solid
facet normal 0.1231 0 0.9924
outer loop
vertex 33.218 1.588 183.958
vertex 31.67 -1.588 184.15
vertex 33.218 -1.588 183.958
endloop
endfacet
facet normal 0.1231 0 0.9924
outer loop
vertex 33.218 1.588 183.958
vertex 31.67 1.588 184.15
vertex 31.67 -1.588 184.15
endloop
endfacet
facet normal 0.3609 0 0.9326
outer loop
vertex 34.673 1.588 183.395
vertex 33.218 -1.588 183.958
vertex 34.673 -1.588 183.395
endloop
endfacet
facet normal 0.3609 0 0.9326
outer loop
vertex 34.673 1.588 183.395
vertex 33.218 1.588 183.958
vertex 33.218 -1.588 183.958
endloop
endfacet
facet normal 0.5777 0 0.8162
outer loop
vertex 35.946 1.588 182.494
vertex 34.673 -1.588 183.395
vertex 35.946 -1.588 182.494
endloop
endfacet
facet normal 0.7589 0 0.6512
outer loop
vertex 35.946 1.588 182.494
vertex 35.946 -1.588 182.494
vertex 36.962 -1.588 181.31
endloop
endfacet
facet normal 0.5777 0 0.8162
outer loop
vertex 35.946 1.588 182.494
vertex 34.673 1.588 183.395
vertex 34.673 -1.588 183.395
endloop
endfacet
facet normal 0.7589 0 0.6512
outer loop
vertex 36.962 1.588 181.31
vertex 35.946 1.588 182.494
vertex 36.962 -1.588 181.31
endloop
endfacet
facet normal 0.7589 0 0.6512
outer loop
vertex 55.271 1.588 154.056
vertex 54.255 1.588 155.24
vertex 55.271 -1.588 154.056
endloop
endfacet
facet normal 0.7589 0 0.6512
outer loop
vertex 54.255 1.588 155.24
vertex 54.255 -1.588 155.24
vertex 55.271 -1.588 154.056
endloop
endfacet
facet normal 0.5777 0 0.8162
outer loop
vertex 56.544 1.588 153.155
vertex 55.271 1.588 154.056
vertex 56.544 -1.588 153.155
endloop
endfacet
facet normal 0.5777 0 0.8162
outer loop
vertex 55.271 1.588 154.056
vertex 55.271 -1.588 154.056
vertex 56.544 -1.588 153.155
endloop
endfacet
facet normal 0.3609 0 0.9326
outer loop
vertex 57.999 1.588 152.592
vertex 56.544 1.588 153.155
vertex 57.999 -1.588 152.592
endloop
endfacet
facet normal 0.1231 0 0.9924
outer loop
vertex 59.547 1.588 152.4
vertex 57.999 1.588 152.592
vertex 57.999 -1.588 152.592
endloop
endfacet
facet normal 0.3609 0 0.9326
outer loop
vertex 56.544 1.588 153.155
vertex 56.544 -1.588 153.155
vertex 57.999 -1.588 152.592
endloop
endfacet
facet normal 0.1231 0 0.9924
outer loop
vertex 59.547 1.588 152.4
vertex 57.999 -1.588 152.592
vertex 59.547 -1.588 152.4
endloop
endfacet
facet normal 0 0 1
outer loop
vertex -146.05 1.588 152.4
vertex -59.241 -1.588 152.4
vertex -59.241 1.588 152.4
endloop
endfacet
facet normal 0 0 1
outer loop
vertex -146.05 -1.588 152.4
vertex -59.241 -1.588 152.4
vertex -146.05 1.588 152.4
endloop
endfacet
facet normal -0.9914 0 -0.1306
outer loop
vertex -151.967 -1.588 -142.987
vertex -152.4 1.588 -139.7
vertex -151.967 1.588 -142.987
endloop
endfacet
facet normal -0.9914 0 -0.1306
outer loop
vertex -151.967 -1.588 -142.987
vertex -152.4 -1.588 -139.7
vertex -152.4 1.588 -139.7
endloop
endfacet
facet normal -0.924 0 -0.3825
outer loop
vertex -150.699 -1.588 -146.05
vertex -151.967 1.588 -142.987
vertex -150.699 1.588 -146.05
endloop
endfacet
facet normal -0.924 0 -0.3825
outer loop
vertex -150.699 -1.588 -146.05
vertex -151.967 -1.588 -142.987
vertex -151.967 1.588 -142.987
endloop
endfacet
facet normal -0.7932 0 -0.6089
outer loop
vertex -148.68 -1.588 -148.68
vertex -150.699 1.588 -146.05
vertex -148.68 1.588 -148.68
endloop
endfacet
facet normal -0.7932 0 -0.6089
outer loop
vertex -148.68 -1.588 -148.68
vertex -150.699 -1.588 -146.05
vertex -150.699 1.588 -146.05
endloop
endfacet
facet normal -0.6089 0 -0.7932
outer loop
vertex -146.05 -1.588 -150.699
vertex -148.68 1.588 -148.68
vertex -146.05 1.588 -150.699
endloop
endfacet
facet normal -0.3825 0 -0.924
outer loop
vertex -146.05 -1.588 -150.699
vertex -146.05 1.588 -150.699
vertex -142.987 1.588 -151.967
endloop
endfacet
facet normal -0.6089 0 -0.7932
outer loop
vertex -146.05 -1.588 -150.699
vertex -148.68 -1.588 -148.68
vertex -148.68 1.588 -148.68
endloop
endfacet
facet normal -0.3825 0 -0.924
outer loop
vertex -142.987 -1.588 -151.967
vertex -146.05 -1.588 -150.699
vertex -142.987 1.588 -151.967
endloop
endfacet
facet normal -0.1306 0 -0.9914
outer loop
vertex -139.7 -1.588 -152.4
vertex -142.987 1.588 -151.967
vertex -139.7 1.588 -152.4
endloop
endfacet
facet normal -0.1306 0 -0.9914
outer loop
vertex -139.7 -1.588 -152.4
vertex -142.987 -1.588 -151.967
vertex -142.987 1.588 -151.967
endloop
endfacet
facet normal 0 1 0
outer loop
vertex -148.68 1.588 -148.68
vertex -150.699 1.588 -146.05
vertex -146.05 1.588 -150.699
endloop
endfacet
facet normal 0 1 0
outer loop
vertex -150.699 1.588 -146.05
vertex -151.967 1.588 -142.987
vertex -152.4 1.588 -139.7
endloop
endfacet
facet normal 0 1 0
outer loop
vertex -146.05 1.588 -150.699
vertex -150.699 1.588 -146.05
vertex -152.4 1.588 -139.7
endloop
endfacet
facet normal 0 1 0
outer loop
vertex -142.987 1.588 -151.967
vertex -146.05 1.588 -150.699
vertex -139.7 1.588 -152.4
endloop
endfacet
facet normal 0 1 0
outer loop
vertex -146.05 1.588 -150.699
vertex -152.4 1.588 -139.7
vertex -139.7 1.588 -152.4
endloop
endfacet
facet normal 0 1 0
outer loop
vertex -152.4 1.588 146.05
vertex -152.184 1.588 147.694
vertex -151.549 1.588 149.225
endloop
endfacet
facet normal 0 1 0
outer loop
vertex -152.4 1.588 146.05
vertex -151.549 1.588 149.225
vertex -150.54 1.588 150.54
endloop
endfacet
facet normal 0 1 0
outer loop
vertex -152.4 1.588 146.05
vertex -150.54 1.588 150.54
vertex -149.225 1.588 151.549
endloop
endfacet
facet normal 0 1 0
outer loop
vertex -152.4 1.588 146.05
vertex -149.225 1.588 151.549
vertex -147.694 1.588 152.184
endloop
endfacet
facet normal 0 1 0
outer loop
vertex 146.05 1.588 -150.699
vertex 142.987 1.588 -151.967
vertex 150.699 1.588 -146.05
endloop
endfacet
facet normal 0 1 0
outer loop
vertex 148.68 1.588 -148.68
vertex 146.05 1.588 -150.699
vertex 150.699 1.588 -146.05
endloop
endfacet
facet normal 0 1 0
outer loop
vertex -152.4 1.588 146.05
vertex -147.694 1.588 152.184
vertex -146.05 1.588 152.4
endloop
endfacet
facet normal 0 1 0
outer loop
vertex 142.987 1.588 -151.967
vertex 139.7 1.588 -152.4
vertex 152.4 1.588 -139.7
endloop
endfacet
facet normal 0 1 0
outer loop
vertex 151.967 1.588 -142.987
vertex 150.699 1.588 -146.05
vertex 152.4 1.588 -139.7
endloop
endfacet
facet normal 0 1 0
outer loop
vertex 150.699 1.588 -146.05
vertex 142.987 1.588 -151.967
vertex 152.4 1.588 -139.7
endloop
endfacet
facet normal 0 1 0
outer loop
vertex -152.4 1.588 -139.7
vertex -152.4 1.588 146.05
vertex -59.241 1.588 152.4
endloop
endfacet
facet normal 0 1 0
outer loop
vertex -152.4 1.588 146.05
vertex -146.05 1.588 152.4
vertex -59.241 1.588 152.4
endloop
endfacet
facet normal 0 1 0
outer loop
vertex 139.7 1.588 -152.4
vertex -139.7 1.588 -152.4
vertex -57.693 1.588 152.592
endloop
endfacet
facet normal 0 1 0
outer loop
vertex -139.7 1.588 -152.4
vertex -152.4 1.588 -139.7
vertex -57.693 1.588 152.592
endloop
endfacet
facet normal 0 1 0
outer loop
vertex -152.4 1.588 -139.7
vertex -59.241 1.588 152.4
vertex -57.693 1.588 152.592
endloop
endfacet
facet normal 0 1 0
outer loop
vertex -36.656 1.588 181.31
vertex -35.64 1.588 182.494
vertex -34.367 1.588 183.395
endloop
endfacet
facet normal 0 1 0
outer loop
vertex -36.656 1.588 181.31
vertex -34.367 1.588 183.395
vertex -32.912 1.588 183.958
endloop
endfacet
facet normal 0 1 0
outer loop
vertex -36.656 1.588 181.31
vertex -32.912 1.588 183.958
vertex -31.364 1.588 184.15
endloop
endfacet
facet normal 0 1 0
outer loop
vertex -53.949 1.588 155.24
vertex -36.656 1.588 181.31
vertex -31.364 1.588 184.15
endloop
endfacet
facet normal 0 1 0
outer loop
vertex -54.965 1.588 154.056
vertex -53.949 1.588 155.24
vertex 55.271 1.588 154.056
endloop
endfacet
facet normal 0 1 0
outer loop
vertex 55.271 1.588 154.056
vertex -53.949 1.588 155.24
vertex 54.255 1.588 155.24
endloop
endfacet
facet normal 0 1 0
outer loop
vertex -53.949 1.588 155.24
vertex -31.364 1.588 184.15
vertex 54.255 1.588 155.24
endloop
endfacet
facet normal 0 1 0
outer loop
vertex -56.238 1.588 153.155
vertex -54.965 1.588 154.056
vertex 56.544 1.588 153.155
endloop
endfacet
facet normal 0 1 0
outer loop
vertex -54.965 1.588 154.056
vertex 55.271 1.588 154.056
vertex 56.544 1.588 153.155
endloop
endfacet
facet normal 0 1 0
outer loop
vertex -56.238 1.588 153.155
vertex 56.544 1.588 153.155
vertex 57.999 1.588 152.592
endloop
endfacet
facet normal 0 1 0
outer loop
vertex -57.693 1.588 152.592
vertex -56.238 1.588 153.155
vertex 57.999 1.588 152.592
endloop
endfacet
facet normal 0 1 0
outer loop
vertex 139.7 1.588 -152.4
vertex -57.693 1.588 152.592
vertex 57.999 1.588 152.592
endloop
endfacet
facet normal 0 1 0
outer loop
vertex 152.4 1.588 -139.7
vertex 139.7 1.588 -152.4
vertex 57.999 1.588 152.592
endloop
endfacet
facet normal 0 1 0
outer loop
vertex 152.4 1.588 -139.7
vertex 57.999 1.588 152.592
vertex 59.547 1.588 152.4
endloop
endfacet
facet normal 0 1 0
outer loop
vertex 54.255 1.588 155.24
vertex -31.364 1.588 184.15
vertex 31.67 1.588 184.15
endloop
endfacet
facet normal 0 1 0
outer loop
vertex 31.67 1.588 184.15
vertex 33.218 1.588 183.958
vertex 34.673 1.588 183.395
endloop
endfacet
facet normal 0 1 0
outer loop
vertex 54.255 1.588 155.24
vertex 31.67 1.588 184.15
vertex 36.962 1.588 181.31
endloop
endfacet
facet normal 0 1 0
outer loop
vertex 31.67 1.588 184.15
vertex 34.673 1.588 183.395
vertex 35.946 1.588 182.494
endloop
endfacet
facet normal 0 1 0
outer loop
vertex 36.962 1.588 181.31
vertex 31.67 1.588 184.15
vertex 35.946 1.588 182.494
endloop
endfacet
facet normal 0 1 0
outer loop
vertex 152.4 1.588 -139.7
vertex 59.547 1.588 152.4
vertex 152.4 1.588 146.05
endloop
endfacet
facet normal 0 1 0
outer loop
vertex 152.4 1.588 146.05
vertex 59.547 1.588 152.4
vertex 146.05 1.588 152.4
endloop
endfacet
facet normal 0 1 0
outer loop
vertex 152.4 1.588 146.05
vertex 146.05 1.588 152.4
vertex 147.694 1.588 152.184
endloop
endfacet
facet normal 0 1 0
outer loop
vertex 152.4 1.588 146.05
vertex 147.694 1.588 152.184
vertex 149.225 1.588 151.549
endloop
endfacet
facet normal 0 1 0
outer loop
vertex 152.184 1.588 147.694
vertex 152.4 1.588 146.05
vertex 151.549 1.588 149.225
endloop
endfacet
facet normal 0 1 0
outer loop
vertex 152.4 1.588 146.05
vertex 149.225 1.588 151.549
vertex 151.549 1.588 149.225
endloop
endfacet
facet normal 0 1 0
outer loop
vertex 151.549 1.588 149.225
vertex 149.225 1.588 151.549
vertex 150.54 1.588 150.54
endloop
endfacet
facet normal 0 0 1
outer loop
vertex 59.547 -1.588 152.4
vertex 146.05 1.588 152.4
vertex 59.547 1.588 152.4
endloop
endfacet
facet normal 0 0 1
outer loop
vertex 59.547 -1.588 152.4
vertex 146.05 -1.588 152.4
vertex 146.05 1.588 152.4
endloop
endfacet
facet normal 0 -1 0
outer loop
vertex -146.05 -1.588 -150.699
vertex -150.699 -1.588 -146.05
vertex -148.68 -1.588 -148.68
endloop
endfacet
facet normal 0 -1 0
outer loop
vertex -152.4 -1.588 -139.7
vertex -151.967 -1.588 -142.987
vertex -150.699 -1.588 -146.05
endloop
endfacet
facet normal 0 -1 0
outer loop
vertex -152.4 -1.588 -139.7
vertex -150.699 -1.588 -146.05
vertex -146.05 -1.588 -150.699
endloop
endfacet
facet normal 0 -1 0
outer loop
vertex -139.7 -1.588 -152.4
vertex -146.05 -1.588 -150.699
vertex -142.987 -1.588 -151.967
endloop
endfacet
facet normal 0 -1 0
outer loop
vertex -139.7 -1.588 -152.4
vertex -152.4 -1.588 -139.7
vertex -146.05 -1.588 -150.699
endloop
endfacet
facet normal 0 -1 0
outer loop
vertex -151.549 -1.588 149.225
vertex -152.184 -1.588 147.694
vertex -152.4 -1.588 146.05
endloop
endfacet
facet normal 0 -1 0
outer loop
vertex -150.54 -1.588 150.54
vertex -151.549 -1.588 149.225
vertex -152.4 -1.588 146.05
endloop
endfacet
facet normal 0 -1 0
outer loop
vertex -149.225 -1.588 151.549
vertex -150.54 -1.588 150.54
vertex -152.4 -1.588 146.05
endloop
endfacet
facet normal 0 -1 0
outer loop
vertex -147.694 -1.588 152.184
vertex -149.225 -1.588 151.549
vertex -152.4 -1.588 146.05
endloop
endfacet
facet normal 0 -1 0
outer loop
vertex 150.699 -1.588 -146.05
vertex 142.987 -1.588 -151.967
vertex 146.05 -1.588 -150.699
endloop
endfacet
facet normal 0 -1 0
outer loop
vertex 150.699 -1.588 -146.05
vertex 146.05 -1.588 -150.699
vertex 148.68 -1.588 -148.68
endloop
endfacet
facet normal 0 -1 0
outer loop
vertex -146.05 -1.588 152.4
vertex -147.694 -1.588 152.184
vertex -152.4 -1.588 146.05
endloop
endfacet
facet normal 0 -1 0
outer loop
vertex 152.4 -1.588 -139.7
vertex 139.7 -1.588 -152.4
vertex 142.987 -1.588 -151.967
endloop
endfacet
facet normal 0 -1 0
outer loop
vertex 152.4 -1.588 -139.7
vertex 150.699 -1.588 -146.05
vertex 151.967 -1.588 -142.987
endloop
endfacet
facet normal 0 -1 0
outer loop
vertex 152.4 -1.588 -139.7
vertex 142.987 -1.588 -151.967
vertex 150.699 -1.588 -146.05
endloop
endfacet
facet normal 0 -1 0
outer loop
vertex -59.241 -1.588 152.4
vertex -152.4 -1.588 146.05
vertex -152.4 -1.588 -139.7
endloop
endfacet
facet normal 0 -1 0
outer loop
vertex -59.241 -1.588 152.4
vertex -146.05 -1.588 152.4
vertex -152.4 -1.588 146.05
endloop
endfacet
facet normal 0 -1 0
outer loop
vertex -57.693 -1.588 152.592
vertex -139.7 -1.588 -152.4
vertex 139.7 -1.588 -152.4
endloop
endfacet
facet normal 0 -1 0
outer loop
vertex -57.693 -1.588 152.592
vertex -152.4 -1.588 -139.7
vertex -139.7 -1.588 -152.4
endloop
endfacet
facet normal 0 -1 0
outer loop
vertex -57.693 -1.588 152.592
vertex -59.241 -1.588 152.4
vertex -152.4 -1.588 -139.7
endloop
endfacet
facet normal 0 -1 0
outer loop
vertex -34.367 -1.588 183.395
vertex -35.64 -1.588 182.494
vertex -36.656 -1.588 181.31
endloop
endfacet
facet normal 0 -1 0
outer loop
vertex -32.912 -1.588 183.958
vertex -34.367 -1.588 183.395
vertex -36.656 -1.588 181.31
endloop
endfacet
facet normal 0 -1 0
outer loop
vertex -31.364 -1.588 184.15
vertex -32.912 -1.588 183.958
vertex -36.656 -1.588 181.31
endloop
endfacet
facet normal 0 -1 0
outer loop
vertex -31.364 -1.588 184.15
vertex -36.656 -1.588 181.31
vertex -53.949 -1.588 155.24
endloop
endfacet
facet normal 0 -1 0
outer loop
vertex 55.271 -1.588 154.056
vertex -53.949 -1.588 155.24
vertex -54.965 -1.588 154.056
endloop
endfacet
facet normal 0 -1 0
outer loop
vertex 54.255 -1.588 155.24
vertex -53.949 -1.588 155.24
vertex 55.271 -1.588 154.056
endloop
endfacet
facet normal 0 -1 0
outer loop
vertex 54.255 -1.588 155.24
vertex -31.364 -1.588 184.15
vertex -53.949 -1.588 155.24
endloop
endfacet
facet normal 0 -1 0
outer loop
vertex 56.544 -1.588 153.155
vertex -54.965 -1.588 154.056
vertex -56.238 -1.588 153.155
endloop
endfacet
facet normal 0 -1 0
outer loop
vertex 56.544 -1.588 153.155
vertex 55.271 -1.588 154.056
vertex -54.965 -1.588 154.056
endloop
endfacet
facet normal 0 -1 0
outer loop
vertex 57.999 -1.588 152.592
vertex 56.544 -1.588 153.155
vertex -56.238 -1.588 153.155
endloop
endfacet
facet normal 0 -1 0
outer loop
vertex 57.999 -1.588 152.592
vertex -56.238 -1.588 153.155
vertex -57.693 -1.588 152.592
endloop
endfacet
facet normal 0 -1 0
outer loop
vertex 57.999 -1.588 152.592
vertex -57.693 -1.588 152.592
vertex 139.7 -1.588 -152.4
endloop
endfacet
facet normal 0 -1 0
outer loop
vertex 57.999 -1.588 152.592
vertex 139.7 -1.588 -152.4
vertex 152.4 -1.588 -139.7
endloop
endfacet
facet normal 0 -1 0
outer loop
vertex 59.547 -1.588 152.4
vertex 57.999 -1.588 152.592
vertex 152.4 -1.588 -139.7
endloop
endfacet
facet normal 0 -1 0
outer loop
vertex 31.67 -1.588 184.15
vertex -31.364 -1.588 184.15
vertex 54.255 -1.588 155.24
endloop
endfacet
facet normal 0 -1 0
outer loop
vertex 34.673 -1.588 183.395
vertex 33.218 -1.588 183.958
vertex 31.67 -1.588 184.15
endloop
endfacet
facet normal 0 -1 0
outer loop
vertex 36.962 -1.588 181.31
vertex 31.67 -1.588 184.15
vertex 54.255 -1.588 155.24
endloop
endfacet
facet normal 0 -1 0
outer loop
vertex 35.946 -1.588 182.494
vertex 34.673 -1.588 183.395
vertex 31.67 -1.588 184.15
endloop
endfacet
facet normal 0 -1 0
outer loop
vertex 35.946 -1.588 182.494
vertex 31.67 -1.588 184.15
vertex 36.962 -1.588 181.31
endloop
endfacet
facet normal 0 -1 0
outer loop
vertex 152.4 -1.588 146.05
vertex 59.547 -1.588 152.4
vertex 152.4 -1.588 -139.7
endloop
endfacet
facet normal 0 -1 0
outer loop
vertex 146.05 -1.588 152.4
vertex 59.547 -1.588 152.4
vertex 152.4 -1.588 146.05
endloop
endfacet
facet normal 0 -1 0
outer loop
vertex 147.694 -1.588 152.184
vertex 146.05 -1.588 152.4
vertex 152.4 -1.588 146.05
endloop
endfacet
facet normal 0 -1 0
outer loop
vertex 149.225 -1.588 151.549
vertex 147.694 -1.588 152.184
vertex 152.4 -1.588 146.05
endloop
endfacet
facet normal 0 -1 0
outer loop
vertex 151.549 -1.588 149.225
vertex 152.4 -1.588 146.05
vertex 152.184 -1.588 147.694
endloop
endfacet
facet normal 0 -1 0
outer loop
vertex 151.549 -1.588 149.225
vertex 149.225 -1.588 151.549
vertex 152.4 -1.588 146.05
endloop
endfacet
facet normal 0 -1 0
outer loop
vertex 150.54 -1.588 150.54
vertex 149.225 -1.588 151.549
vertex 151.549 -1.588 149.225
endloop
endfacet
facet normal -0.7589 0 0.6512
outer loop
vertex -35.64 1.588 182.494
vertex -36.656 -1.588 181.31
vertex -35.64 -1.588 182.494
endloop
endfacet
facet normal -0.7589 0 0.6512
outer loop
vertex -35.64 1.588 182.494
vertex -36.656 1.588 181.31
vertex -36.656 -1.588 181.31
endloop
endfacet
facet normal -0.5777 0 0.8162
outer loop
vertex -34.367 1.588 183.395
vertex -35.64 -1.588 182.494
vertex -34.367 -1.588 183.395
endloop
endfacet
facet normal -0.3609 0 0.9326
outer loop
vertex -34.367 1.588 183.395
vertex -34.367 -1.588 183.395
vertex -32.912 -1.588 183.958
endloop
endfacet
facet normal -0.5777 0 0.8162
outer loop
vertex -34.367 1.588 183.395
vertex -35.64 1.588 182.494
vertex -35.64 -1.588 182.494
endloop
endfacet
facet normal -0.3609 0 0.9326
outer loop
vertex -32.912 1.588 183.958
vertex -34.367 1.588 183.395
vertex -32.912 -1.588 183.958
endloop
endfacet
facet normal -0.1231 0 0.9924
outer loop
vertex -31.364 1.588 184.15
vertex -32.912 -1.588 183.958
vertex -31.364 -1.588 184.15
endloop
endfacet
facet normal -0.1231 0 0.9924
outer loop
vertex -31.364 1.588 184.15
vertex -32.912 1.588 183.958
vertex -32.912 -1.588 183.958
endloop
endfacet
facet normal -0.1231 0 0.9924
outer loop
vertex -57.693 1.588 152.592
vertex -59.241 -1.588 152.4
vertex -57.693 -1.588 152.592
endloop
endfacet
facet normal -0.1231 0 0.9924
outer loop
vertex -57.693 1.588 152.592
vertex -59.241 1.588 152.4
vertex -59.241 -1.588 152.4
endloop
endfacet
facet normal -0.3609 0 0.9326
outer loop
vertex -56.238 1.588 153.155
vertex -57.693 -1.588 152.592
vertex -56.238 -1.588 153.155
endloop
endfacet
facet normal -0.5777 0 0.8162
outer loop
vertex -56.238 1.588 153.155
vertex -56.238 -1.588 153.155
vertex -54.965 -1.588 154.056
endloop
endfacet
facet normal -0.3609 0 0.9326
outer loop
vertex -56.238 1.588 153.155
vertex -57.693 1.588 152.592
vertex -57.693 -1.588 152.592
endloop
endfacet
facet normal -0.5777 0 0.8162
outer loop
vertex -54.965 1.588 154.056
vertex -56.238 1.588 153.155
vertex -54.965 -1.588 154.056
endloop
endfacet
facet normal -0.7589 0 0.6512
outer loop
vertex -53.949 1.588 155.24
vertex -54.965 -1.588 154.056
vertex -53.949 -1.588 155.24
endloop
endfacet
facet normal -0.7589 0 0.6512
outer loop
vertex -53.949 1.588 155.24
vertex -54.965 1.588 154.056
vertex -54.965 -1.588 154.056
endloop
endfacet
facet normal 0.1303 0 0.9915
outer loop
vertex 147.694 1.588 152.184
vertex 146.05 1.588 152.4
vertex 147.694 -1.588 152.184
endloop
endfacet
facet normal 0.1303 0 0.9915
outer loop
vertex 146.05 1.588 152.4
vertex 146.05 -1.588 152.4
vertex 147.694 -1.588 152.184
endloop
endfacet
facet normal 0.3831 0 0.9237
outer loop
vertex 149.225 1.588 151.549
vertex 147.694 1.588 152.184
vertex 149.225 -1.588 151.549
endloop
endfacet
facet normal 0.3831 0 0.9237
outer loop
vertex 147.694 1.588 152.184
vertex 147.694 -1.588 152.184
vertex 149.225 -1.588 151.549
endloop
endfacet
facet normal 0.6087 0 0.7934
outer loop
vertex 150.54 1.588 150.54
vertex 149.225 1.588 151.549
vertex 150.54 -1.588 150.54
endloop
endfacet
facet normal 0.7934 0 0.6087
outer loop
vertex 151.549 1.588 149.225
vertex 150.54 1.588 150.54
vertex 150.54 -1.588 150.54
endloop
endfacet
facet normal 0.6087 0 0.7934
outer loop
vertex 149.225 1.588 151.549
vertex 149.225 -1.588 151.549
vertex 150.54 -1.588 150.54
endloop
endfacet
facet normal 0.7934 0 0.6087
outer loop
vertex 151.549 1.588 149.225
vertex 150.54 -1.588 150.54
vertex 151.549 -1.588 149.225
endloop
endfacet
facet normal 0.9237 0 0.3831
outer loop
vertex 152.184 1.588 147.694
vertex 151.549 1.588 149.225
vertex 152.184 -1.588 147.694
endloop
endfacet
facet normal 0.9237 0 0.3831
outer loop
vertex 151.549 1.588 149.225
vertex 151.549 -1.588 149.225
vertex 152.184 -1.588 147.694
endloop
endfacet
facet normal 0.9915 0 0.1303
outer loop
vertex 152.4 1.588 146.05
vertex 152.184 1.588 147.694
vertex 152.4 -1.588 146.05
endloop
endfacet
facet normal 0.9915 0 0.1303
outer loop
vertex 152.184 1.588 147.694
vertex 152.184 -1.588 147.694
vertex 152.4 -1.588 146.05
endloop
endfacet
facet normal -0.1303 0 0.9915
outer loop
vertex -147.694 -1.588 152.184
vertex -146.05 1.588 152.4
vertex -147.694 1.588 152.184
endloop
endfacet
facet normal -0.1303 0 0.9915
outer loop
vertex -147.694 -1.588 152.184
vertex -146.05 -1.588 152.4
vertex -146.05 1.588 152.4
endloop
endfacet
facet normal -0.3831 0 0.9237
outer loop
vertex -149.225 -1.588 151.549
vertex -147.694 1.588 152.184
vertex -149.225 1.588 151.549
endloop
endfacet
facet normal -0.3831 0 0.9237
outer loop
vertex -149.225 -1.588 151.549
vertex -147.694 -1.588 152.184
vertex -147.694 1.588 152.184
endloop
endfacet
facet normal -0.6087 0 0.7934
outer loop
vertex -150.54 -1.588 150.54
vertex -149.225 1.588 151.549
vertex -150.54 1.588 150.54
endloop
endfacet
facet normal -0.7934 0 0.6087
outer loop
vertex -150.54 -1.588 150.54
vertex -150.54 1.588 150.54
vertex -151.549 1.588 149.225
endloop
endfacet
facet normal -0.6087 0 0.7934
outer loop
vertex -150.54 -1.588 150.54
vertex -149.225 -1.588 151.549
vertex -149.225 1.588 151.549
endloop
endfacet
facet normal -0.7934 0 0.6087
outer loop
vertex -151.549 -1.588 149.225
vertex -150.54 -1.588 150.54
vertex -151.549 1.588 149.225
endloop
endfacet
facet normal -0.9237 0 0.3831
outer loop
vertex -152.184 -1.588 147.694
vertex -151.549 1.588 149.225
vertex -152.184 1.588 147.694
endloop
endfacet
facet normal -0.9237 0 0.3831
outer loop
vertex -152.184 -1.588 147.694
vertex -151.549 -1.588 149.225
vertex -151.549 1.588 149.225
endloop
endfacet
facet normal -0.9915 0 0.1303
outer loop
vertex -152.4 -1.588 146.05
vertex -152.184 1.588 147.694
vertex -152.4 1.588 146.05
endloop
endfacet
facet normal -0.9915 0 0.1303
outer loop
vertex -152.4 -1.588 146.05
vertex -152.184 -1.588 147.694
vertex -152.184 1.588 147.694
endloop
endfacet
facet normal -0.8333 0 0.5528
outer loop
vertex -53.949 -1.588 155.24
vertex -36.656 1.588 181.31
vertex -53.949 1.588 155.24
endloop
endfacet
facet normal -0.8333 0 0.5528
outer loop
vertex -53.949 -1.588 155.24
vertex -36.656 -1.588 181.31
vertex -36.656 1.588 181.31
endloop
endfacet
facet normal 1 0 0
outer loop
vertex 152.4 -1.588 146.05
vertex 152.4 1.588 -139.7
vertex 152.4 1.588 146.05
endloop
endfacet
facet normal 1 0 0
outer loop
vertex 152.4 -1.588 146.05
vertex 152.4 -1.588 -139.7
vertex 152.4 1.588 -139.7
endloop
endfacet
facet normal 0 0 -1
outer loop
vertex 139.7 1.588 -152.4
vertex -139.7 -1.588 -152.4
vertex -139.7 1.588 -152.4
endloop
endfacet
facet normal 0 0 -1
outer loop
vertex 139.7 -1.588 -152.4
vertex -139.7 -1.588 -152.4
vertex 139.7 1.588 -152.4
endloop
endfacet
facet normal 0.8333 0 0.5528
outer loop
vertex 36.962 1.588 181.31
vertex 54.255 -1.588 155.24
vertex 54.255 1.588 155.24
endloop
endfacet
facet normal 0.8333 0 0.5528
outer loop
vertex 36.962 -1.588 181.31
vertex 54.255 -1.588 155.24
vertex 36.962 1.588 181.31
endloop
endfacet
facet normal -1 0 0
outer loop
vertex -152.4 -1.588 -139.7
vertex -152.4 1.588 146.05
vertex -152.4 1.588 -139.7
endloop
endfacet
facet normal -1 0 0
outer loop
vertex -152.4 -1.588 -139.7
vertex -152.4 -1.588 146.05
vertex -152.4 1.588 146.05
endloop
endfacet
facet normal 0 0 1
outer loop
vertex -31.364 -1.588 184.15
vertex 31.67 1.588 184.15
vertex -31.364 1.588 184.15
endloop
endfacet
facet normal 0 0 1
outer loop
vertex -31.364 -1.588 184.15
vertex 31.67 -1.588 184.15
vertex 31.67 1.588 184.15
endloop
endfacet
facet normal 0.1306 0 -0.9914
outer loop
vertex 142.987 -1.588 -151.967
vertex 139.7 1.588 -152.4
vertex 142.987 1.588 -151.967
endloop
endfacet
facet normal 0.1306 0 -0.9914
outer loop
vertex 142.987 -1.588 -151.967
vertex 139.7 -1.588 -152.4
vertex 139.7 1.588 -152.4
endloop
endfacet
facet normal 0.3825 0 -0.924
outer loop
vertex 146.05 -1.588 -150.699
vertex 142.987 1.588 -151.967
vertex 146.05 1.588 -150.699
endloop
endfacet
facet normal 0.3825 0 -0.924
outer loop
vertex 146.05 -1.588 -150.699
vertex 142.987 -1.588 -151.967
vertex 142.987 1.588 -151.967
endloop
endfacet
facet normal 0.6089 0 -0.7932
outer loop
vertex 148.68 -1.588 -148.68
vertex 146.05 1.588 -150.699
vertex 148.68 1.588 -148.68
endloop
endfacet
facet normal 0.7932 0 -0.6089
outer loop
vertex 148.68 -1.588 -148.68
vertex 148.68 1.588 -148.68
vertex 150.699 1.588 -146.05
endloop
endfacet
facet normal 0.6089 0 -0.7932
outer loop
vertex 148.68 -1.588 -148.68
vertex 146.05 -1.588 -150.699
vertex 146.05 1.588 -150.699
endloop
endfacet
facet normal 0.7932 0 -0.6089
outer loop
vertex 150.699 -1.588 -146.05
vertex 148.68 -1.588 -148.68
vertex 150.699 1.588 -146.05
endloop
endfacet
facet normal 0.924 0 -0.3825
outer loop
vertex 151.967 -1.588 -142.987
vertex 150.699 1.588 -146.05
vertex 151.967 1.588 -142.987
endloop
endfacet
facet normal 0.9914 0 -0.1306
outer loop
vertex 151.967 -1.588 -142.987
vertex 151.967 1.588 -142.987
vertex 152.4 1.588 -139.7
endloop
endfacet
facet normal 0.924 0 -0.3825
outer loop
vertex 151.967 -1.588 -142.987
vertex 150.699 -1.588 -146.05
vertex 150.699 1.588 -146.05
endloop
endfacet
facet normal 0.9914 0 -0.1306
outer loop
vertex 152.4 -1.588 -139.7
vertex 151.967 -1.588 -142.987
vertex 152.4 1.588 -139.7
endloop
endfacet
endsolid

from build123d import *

# Parameters (mm, degrees)
F1_DEPTH = 1.5875
F2_R     = 6.35
F3_R     = 12.7


with BuildPart() as f1:
    # F0 (on Front) → F1 (new body, symmetric)
    with BuildSketch(Plane.XZ):
        Polygon((-55.833071, 152.4), (-152.4, 152.4), (-152.4, -152.4), (152.4, -152.4), (152.4, 152.4), (56.139176, 152.4), (35.078053, 184.149631), (-34.771947, 184.149631), align=None)
    extrude(amount=F1_DEPTH, both=True)

    # F2
    f2_edges = [f1.edges().sort_by_distance(p)[0] for p in [
        (152.4, 0, 152.4),
        (-152.4, 0, 152.4),
        (-55.833071, 0, 152.4),
        (-34.771947, 0, 184.149631),
        (35.078053, 0, 184.149631),
        (56.139176, 0, 152.4),
    ]]
    fillet(f2_edges, radius=F2_R)

    # F3
    f3_edges = [f1.edges().sort_by_distance(p)[0] for p in [
        (-152.4, 0, -152.4),
        (152.4, 0, -152.4),
    ]]
    fillet(f3_edges, radius=F3_R)


solid = f1.part
